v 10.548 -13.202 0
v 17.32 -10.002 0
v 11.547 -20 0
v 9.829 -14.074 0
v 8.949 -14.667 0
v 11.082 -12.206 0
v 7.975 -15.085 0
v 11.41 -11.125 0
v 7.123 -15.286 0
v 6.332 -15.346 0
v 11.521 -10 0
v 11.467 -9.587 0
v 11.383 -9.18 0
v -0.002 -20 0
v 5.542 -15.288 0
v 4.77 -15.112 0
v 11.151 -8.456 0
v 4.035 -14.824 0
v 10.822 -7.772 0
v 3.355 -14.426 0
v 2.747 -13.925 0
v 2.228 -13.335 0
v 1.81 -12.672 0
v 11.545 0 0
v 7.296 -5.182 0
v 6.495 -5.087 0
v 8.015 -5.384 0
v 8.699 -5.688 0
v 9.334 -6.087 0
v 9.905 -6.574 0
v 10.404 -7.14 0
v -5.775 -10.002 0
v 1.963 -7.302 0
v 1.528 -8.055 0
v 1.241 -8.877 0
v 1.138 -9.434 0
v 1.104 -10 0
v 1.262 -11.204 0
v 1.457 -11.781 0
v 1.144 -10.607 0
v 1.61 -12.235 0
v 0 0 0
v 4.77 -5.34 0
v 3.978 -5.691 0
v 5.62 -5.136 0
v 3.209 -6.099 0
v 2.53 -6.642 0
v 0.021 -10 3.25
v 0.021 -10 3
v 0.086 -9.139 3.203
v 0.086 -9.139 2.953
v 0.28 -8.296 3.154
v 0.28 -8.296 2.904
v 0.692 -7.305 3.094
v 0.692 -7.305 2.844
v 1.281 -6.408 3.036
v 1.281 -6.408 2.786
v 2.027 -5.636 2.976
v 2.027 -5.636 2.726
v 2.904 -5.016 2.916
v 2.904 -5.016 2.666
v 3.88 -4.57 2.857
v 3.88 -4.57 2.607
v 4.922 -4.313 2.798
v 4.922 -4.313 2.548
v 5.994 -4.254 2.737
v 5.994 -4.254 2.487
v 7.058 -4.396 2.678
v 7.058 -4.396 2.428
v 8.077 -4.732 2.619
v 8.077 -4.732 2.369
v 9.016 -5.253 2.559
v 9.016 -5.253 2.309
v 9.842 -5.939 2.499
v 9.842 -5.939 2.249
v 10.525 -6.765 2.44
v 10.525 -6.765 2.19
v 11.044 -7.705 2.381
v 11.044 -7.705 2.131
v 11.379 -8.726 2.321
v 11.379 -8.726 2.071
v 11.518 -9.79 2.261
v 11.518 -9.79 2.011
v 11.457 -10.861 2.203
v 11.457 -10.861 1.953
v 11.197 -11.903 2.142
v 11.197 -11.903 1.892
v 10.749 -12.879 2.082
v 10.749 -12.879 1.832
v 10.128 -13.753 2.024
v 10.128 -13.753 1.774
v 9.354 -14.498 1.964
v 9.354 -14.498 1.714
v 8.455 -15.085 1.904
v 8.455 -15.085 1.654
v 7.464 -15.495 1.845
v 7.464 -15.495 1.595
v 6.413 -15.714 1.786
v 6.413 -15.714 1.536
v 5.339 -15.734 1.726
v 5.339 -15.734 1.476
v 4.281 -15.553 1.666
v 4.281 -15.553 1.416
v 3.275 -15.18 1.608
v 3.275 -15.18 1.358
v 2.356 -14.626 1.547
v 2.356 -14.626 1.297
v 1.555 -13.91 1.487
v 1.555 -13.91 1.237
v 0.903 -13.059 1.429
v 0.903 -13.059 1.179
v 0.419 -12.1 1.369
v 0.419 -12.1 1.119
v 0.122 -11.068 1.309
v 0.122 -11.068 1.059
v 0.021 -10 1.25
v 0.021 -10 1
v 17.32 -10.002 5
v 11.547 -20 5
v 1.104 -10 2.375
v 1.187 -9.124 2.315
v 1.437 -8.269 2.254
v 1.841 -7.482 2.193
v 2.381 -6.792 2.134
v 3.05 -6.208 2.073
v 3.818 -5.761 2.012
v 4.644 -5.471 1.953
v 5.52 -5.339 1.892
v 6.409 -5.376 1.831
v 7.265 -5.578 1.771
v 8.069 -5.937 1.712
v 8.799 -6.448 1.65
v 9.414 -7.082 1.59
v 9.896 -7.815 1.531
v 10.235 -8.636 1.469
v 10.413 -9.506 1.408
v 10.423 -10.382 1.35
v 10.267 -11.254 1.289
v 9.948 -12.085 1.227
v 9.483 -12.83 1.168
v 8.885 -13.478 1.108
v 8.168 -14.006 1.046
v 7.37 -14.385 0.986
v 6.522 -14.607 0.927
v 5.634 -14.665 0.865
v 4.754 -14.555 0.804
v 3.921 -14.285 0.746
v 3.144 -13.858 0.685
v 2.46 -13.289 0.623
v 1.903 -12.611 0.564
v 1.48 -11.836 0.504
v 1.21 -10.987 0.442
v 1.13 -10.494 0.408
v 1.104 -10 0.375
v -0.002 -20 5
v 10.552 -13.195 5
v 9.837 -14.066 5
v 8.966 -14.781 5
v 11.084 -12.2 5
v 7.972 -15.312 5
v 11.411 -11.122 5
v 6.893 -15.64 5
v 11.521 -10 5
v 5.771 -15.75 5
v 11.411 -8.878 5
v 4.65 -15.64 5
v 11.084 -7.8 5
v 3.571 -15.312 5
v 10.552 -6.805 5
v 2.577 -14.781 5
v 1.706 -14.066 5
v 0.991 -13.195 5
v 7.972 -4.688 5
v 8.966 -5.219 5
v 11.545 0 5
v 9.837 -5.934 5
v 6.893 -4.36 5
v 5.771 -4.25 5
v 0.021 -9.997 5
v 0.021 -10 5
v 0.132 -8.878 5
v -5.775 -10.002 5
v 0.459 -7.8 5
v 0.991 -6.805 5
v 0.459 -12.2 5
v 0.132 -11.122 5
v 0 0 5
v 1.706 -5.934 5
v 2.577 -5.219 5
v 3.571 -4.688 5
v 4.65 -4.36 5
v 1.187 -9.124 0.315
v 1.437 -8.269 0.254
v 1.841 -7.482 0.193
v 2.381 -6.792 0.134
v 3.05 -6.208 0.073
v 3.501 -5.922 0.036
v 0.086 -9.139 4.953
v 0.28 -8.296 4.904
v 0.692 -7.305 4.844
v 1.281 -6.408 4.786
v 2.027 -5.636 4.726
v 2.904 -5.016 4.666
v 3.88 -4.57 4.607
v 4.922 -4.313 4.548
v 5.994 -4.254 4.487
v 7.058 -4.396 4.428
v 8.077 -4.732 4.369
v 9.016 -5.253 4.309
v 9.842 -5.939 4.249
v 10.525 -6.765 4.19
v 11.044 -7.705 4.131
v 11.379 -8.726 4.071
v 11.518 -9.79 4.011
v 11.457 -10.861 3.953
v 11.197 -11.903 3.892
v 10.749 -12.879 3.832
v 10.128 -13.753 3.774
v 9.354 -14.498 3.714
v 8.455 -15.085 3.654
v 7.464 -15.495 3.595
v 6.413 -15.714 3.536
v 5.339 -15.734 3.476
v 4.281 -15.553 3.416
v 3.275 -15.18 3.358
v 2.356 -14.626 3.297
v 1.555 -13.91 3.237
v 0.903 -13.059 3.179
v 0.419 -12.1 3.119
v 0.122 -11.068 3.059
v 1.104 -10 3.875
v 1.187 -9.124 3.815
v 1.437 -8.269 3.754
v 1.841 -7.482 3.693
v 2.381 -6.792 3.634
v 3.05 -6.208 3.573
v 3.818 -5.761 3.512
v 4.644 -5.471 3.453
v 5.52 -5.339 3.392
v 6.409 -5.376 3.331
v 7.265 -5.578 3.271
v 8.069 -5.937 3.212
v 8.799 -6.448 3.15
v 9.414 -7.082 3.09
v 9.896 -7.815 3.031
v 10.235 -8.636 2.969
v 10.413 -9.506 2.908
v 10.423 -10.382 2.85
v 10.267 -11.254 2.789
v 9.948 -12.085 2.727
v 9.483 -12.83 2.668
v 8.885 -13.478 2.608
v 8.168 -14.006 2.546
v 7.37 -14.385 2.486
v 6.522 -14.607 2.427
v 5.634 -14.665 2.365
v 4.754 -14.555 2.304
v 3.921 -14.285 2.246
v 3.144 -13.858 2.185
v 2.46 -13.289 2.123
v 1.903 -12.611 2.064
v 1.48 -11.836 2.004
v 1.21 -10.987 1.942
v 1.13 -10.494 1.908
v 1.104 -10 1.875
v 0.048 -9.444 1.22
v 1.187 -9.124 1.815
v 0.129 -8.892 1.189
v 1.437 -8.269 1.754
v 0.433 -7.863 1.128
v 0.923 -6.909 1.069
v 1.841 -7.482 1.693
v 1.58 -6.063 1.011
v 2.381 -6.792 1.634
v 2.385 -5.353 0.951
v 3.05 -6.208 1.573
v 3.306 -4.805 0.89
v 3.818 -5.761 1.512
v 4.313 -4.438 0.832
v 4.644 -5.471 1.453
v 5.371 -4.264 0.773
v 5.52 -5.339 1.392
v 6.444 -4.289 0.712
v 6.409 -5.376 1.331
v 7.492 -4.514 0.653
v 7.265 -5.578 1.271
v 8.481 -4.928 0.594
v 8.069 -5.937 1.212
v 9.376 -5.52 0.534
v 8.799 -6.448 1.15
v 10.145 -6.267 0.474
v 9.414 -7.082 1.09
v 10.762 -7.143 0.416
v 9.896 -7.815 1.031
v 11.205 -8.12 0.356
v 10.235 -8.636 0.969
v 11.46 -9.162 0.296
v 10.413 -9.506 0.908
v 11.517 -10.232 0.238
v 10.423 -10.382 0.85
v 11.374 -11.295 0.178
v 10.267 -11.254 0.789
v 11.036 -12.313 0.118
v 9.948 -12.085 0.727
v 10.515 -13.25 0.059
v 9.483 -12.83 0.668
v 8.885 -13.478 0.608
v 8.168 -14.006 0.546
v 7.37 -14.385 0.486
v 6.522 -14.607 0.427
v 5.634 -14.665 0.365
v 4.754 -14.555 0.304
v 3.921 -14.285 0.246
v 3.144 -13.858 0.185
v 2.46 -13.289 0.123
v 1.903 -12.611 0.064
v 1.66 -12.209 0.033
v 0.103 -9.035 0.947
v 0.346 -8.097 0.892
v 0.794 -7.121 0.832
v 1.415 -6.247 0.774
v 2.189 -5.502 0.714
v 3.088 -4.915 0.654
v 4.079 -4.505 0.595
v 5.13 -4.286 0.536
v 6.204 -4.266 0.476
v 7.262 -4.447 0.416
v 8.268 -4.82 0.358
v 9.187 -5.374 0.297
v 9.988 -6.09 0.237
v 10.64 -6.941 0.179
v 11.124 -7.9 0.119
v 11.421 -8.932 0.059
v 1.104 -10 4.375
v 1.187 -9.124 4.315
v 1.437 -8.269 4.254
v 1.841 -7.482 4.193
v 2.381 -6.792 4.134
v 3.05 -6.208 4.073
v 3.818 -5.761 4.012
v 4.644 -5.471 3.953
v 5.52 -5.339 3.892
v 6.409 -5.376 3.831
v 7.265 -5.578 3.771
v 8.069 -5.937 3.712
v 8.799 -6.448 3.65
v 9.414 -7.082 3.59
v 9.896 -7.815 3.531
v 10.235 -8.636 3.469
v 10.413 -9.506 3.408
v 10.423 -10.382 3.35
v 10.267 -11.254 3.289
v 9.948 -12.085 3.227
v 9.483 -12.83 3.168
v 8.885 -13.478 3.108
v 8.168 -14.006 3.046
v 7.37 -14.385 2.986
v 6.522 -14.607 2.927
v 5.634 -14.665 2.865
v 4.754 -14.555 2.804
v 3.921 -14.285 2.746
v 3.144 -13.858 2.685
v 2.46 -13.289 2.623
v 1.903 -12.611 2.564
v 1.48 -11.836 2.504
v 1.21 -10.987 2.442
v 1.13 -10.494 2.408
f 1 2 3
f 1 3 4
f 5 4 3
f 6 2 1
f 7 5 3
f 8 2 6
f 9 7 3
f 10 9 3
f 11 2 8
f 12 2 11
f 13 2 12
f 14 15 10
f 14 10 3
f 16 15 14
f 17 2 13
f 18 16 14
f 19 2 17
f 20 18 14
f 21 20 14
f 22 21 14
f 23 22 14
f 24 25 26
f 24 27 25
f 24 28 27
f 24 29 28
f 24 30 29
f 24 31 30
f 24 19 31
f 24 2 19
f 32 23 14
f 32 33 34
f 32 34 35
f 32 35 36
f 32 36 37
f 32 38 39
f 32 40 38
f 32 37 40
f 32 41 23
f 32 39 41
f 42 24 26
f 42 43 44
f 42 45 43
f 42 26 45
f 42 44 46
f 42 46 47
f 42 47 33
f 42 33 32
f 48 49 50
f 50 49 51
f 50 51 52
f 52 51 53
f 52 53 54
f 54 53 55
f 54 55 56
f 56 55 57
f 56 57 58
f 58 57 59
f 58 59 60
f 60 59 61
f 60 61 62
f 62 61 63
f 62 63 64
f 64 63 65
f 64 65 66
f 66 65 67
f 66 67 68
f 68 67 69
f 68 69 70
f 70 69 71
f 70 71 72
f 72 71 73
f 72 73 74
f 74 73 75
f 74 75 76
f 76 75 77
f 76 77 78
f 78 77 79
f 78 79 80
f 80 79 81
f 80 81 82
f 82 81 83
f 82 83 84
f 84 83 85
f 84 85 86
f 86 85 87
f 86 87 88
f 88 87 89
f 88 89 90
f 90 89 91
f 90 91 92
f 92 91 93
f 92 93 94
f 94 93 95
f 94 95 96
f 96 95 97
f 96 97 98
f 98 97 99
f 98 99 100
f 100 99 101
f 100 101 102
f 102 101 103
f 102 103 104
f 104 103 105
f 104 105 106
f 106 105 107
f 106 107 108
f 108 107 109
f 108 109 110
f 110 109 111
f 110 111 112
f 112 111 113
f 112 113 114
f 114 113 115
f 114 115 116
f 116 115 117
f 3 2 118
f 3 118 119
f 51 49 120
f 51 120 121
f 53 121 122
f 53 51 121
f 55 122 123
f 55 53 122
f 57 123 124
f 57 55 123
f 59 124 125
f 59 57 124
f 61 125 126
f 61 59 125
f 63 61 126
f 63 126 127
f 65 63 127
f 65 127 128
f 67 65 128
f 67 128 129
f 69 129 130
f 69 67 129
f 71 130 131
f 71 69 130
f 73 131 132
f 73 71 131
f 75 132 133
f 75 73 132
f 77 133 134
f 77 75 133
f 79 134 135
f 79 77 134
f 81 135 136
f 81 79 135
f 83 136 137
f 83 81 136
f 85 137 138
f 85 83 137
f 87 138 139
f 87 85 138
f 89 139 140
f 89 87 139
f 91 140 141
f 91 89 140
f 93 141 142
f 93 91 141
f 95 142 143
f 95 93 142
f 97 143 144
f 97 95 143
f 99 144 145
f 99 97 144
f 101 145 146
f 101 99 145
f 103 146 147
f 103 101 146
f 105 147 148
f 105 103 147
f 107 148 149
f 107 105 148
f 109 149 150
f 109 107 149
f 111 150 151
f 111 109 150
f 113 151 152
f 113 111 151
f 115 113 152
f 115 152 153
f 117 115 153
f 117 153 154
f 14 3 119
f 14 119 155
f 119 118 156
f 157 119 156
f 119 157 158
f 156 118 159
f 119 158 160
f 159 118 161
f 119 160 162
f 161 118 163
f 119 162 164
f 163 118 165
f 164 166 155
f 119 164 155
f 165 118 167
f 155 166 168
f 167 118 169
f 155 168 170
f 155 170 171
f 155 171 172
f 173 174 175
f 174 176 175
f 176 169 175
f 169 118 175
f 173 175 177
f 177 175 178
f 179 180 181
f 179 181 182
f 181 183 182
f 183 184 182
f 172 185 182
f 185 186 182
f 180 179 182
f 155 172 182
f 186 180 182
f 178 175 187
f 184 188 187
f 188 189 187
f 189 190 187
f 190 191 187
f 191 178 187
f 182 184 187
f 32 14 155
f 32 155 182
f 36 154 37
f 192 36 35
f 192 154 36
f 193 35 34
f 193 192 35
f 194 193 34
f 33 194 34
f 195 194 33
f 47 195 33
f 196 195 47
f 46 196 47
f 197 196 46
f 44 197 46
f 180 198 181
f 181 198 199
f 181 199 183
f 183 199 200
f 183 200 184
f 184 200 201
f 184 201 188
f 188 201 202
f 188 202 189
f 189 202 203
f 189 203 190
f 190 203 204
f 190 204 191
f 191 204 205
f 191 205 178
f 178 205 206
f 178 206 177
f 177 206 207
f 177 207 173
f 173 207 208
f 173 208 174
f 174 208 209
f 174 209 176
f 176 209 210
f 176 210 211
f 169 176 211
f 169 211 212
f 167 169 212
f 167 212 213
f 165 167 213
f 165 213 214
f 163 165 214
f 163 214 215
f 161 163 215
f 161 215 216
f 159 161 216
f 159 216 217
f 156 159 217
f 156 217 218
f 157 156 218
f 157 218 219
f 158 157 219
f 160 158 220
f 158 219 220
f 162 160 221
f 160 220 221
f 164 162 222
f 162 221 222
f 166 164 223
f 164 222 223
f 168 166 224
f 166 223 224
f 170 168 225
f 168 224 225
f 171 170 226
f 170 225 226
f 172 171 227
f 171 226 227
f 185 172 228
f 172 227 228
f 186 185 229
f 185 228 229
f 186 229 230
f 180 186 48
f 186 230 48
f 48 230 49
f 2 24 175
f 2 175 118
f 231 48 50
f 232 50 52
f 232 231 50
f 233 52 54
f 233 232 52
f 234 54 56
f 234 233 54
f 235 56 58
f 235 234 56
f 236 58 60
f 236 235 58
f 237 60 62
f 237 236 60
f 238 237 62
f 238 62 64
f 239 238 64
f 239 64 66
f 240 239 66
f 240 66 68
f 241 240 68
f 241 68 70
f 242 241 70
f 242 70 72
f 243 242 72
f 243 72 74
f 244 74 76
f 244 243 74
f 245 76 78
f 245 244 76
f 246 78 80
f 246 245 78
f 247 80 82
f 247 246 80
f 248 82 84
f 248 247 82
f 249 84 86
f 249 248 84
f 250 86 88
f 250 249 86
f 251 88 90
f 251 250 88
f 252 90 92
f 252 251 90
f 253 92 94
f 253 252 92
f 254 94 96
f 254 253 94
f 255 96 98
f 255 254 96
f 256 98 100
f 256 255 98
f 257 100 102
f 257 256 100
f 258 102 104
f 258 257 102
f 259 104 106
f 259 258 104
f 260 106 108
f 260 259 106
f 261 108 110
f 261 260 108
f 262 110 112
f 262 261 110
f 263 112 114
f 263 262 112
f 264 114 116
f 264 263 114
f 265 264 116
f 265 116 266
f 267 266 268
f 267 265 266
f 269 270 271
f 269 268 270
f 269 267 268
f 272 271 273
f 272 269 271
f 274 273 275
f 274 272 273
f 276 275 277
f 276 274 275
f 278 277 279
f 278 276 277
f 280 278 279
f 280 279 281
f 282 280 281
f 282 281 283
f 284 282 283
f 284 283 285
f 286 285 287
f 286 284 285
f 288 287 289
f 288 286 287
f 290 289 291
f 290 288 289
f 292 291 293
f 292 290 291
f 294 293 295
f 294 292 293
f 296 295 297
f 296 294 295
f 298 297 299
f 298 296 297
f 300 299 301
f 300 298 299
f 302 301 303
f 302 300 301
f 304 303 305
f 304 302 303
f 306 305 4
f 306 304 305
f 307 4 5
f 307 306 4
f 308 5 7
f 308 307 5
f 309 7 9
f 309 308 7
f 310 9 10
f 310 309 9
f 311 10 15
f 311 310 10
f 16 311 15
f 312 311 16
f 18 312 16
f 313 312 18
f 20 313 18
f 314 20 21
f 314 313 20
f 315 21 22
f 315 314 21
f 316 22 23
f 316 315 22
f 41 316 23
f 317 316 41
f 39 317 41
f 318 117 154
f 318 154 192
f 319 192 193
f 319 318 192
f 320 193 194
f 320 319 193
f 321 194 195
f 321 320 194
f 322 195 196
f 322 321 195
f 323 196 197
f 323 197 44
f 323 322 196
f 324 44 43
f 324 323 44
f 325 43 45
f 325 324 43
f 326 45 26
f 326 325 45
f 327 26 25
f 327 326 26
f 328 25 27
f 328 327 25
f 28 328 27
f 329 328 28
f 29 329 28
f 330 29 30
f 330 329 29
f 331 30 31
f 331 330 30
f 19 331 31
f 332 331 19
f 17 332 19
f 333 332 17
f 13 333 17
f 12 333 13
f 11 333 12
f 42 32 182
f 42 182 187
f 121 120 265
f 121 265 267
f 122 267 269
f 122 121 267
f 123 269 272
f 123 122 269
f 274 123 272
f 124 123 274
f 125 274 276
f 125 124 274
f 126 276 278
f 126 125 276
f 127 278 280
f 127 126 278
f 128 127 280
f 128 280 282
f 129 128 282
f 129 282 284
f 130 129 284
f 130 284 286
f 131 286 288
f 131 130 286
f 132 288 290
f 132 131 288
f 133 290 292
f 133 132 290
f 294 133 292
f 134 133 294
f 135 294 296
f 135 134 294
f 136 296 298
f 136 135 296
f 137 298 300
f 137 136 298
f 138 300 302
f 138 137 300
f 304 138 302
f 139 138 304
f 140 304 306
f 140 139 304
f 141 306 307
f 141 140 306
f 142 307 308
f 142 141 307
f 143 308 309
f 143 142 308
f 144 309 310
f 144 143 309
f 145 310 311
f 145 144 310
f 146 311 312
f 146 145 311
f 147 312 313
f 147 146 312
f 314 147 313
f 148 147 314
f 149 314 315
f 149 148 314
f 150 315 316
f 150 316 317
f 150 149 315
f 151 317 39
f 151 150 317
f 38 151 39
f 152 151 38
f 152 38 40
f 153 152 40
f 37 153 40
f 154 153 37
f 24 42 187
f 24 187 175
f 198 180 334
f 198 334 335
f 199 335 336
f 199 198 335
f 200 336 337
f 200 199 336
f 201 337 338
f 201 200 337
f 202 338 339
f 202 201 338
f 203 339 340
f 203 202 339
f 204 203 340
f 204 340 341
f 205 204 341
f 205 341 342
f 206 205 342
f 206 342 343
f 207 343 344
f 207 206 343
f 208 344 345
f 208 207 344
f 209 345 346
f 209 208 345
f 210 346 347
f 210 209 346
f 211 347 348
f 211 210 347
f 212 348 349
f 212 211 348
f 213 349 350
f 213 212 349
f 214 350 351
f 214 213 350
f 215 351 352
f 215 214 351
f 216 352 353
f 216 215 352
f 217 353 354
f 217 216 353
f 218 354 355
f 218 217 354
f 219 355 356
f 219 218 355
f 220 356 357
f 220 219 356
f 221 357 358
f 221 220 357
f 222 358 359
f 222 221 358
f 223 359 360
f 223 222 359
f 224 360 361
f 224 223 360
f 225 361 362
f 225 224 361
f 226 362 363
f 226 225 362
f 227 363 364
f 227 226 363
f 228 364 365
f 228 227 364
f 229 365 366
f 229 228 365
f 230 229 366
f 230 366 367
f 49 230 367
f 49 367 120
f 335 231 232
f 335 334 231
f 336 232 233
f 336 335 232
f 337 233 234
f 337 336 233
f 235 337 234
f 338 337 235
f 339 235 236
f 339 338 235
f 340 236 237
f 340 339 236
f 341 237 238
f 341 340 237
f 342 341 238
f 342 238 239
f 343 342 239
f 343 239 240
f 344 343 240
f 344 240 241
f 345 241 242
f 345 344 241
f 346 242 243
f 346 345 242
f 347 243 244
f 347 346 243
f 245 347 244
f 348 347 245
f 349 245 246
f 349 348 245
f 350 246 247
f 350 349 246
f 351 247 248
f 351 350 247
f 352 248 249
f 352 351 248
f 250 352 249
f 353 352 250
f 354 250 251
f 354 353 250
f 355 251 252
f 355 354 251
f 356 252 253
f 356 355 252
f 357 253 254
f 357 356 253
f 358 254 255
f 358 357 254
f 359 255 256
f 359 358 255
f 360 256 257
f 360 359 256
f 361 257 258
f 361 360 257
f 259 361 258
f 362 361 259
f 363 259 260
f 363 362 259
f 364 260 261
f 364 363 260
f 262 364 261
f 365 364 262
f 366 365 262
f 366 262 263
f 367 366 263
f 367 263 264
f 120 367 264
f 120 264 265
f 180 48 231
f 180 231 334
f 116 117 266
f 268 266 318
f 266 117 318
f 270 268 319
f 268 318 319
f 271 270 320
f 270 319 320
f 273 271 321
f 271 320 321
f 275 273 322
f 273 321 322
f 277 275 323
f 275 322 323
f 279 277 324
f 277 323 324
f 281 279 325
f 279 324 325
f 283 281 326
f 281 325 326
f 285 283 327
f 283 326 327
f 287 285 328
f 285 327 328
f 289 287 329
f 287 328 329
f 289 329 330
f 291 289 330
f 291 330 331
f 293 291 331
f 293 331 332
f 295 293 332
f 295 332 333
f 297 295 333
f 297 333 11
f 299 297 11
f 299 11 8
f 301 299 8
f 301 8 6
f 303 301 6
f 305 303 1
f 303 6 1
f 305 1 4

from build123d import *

# Parameters (mm, degrees)
AUFSATZ_LINEAR_AUSTRAGEN1_DEPTH   = 5
GEWINDEBOHRUNG_F_R_PG7_F_HRUNG1_D = 11.5
GEWINDE1_PITCH                    = 2
SKIZZE12_W                        = 16.387995399
SKIZZE12_H                        = 16.357045455
SCHNITT_LINEAR_AUSTRAGEN1_DEPTH   = 10


with BuildPart() as part:
    # Skizze1 → Aufsatz-Linear austragen1 (new body)
    with BuildSketch(Plane.XY):
        Polygon((0, 0), (11.545, 0), (17.319505384, -10.001736713), (11.547005384, -20), (-0.002005384, -20), (-5.774505384, -10.001736713), align=None)
    extrude(amount=AUFSATZ_LINEAR_AUSTRAGEN1_DEPTH)

    # Gewindebohrung für Pg7 Führung1 (through all)
    with Locations(Plane(origin=(5.771497308, -10, 5), x_dir=(1, 0, 0), z_dir=(0, 0, 1))):
        with Locations((0, 0)):
            Hole(GEWINDEBOHRUNG_F_R_PG7_F_HRUNG1_D / 2)

    # Gewinde1: the profile of Gewindeprofil2 profile screwed along a right-hand helix of 5 turns, 10 arcs to a turn; built about Z, then put on its axis
    gewinde1_z = Axis((0, 0, 0), (0, 0, 1))
    gewinde1_corners = [(5.7503, 0, -0.000173205), (5.7503, 0, 1.7501732), (4.66746825, 0, 1.124999997), (4.66746825, 0, 0.624999997)]
    with BuildLine(mode=Mode.PRIVATE) as gewinde1_profile:
        Line(gewinde1_corners[0], gewinde1_corners[1])
        Line(gewinde1_corners[1], gewinde1_corners[2])
        Line(gewinde1_corners[2], gewinde1_corners[3])
        Line(gewinde1_corners[3], gewinde1_corners[0])
    gewinde1_cap = Face(gewinde1_profile.wire())
    gewinde1_turn_angles = [0, 18, 36, 54, 72, 90, 108, 126, 144, 162, 180, 198, 216, 234, 252, 270, 288, 306, 324, 342, 360]
    gewinde1_turn_weights = [1, 0.9510565162951535, 1, 0.9510565162951535, 1, 0.9510565162951535, 1, 0.9510565162951535, 1, 0.9510565162951535, 1, 0.9510565162951535, 1, 0.9510565162951535, 1, 0.9510565162951535, 1, 0.9510565162951535, 1, 0.9510565162951535, 1]
    gewinde1_turn_rails = [Edge.make_bspline([Vector(p[0], p[1], 0).rotate(gewinde1_z, gewinde1_turn_angles[k]) / gewinde1_turn_weights[k] + Vector(0, 0, p[2] + GEWINDE1_PITCH * gewinde1_turn_angles[k] / 360) for k in range(21)], [0, 0, 0, 1, 1, 2, 2, 3, 3, 4, 4, 5, 5, 6, 6, 7, 7, 8, 8, 9, 9, 10, 10, 10], 2, gewinde1_turn_weights) for p in gewinde1_corners]
    gewinde1_turn_sides = [Face.make_surface_from_curves(gewinde1_turn_rails[p[0]], gewinde1_turn_rails[p[1]]) for p in [(0, 1), (1, 2), (2, 3), (3, 0)]]
    gewinde1 = Plane(origin=(5.771497308, -10, 5), x_dir=(-1, 0, 0), z_dir=(0, 0, -1)) * Solid(Shell([*[p.moved(Location((0, 0, GEWINDE1_PITCH * i))) for i in range(5) for p in gewinde1_turn_sides], gewinde1_cap, gewinde1_cap.rotate(gewinde1_z, 1800).moved(Location((0, 0, GEWINDE1_PITCH * 1800 / 360)))]))
    add(gewinde1)

    # Skizze12 → Schnitt-Linear austragen1 (cut)
    with BuildSketch(Plane(origin=(0, 0, 0), x_dir=(-1, 0, 0), z_dir=(0, 0, -1))):
        with Locations((-5.65643771, -10.147012235)):
            Rectangle(SKIZZE12_W, SKIZZE12_H)
    extrude(amount=SCHNITT_LINEAR_AUSTRAGEN1_DEPTH, mode=Mode.SUBTRACT)


solid = part.part
